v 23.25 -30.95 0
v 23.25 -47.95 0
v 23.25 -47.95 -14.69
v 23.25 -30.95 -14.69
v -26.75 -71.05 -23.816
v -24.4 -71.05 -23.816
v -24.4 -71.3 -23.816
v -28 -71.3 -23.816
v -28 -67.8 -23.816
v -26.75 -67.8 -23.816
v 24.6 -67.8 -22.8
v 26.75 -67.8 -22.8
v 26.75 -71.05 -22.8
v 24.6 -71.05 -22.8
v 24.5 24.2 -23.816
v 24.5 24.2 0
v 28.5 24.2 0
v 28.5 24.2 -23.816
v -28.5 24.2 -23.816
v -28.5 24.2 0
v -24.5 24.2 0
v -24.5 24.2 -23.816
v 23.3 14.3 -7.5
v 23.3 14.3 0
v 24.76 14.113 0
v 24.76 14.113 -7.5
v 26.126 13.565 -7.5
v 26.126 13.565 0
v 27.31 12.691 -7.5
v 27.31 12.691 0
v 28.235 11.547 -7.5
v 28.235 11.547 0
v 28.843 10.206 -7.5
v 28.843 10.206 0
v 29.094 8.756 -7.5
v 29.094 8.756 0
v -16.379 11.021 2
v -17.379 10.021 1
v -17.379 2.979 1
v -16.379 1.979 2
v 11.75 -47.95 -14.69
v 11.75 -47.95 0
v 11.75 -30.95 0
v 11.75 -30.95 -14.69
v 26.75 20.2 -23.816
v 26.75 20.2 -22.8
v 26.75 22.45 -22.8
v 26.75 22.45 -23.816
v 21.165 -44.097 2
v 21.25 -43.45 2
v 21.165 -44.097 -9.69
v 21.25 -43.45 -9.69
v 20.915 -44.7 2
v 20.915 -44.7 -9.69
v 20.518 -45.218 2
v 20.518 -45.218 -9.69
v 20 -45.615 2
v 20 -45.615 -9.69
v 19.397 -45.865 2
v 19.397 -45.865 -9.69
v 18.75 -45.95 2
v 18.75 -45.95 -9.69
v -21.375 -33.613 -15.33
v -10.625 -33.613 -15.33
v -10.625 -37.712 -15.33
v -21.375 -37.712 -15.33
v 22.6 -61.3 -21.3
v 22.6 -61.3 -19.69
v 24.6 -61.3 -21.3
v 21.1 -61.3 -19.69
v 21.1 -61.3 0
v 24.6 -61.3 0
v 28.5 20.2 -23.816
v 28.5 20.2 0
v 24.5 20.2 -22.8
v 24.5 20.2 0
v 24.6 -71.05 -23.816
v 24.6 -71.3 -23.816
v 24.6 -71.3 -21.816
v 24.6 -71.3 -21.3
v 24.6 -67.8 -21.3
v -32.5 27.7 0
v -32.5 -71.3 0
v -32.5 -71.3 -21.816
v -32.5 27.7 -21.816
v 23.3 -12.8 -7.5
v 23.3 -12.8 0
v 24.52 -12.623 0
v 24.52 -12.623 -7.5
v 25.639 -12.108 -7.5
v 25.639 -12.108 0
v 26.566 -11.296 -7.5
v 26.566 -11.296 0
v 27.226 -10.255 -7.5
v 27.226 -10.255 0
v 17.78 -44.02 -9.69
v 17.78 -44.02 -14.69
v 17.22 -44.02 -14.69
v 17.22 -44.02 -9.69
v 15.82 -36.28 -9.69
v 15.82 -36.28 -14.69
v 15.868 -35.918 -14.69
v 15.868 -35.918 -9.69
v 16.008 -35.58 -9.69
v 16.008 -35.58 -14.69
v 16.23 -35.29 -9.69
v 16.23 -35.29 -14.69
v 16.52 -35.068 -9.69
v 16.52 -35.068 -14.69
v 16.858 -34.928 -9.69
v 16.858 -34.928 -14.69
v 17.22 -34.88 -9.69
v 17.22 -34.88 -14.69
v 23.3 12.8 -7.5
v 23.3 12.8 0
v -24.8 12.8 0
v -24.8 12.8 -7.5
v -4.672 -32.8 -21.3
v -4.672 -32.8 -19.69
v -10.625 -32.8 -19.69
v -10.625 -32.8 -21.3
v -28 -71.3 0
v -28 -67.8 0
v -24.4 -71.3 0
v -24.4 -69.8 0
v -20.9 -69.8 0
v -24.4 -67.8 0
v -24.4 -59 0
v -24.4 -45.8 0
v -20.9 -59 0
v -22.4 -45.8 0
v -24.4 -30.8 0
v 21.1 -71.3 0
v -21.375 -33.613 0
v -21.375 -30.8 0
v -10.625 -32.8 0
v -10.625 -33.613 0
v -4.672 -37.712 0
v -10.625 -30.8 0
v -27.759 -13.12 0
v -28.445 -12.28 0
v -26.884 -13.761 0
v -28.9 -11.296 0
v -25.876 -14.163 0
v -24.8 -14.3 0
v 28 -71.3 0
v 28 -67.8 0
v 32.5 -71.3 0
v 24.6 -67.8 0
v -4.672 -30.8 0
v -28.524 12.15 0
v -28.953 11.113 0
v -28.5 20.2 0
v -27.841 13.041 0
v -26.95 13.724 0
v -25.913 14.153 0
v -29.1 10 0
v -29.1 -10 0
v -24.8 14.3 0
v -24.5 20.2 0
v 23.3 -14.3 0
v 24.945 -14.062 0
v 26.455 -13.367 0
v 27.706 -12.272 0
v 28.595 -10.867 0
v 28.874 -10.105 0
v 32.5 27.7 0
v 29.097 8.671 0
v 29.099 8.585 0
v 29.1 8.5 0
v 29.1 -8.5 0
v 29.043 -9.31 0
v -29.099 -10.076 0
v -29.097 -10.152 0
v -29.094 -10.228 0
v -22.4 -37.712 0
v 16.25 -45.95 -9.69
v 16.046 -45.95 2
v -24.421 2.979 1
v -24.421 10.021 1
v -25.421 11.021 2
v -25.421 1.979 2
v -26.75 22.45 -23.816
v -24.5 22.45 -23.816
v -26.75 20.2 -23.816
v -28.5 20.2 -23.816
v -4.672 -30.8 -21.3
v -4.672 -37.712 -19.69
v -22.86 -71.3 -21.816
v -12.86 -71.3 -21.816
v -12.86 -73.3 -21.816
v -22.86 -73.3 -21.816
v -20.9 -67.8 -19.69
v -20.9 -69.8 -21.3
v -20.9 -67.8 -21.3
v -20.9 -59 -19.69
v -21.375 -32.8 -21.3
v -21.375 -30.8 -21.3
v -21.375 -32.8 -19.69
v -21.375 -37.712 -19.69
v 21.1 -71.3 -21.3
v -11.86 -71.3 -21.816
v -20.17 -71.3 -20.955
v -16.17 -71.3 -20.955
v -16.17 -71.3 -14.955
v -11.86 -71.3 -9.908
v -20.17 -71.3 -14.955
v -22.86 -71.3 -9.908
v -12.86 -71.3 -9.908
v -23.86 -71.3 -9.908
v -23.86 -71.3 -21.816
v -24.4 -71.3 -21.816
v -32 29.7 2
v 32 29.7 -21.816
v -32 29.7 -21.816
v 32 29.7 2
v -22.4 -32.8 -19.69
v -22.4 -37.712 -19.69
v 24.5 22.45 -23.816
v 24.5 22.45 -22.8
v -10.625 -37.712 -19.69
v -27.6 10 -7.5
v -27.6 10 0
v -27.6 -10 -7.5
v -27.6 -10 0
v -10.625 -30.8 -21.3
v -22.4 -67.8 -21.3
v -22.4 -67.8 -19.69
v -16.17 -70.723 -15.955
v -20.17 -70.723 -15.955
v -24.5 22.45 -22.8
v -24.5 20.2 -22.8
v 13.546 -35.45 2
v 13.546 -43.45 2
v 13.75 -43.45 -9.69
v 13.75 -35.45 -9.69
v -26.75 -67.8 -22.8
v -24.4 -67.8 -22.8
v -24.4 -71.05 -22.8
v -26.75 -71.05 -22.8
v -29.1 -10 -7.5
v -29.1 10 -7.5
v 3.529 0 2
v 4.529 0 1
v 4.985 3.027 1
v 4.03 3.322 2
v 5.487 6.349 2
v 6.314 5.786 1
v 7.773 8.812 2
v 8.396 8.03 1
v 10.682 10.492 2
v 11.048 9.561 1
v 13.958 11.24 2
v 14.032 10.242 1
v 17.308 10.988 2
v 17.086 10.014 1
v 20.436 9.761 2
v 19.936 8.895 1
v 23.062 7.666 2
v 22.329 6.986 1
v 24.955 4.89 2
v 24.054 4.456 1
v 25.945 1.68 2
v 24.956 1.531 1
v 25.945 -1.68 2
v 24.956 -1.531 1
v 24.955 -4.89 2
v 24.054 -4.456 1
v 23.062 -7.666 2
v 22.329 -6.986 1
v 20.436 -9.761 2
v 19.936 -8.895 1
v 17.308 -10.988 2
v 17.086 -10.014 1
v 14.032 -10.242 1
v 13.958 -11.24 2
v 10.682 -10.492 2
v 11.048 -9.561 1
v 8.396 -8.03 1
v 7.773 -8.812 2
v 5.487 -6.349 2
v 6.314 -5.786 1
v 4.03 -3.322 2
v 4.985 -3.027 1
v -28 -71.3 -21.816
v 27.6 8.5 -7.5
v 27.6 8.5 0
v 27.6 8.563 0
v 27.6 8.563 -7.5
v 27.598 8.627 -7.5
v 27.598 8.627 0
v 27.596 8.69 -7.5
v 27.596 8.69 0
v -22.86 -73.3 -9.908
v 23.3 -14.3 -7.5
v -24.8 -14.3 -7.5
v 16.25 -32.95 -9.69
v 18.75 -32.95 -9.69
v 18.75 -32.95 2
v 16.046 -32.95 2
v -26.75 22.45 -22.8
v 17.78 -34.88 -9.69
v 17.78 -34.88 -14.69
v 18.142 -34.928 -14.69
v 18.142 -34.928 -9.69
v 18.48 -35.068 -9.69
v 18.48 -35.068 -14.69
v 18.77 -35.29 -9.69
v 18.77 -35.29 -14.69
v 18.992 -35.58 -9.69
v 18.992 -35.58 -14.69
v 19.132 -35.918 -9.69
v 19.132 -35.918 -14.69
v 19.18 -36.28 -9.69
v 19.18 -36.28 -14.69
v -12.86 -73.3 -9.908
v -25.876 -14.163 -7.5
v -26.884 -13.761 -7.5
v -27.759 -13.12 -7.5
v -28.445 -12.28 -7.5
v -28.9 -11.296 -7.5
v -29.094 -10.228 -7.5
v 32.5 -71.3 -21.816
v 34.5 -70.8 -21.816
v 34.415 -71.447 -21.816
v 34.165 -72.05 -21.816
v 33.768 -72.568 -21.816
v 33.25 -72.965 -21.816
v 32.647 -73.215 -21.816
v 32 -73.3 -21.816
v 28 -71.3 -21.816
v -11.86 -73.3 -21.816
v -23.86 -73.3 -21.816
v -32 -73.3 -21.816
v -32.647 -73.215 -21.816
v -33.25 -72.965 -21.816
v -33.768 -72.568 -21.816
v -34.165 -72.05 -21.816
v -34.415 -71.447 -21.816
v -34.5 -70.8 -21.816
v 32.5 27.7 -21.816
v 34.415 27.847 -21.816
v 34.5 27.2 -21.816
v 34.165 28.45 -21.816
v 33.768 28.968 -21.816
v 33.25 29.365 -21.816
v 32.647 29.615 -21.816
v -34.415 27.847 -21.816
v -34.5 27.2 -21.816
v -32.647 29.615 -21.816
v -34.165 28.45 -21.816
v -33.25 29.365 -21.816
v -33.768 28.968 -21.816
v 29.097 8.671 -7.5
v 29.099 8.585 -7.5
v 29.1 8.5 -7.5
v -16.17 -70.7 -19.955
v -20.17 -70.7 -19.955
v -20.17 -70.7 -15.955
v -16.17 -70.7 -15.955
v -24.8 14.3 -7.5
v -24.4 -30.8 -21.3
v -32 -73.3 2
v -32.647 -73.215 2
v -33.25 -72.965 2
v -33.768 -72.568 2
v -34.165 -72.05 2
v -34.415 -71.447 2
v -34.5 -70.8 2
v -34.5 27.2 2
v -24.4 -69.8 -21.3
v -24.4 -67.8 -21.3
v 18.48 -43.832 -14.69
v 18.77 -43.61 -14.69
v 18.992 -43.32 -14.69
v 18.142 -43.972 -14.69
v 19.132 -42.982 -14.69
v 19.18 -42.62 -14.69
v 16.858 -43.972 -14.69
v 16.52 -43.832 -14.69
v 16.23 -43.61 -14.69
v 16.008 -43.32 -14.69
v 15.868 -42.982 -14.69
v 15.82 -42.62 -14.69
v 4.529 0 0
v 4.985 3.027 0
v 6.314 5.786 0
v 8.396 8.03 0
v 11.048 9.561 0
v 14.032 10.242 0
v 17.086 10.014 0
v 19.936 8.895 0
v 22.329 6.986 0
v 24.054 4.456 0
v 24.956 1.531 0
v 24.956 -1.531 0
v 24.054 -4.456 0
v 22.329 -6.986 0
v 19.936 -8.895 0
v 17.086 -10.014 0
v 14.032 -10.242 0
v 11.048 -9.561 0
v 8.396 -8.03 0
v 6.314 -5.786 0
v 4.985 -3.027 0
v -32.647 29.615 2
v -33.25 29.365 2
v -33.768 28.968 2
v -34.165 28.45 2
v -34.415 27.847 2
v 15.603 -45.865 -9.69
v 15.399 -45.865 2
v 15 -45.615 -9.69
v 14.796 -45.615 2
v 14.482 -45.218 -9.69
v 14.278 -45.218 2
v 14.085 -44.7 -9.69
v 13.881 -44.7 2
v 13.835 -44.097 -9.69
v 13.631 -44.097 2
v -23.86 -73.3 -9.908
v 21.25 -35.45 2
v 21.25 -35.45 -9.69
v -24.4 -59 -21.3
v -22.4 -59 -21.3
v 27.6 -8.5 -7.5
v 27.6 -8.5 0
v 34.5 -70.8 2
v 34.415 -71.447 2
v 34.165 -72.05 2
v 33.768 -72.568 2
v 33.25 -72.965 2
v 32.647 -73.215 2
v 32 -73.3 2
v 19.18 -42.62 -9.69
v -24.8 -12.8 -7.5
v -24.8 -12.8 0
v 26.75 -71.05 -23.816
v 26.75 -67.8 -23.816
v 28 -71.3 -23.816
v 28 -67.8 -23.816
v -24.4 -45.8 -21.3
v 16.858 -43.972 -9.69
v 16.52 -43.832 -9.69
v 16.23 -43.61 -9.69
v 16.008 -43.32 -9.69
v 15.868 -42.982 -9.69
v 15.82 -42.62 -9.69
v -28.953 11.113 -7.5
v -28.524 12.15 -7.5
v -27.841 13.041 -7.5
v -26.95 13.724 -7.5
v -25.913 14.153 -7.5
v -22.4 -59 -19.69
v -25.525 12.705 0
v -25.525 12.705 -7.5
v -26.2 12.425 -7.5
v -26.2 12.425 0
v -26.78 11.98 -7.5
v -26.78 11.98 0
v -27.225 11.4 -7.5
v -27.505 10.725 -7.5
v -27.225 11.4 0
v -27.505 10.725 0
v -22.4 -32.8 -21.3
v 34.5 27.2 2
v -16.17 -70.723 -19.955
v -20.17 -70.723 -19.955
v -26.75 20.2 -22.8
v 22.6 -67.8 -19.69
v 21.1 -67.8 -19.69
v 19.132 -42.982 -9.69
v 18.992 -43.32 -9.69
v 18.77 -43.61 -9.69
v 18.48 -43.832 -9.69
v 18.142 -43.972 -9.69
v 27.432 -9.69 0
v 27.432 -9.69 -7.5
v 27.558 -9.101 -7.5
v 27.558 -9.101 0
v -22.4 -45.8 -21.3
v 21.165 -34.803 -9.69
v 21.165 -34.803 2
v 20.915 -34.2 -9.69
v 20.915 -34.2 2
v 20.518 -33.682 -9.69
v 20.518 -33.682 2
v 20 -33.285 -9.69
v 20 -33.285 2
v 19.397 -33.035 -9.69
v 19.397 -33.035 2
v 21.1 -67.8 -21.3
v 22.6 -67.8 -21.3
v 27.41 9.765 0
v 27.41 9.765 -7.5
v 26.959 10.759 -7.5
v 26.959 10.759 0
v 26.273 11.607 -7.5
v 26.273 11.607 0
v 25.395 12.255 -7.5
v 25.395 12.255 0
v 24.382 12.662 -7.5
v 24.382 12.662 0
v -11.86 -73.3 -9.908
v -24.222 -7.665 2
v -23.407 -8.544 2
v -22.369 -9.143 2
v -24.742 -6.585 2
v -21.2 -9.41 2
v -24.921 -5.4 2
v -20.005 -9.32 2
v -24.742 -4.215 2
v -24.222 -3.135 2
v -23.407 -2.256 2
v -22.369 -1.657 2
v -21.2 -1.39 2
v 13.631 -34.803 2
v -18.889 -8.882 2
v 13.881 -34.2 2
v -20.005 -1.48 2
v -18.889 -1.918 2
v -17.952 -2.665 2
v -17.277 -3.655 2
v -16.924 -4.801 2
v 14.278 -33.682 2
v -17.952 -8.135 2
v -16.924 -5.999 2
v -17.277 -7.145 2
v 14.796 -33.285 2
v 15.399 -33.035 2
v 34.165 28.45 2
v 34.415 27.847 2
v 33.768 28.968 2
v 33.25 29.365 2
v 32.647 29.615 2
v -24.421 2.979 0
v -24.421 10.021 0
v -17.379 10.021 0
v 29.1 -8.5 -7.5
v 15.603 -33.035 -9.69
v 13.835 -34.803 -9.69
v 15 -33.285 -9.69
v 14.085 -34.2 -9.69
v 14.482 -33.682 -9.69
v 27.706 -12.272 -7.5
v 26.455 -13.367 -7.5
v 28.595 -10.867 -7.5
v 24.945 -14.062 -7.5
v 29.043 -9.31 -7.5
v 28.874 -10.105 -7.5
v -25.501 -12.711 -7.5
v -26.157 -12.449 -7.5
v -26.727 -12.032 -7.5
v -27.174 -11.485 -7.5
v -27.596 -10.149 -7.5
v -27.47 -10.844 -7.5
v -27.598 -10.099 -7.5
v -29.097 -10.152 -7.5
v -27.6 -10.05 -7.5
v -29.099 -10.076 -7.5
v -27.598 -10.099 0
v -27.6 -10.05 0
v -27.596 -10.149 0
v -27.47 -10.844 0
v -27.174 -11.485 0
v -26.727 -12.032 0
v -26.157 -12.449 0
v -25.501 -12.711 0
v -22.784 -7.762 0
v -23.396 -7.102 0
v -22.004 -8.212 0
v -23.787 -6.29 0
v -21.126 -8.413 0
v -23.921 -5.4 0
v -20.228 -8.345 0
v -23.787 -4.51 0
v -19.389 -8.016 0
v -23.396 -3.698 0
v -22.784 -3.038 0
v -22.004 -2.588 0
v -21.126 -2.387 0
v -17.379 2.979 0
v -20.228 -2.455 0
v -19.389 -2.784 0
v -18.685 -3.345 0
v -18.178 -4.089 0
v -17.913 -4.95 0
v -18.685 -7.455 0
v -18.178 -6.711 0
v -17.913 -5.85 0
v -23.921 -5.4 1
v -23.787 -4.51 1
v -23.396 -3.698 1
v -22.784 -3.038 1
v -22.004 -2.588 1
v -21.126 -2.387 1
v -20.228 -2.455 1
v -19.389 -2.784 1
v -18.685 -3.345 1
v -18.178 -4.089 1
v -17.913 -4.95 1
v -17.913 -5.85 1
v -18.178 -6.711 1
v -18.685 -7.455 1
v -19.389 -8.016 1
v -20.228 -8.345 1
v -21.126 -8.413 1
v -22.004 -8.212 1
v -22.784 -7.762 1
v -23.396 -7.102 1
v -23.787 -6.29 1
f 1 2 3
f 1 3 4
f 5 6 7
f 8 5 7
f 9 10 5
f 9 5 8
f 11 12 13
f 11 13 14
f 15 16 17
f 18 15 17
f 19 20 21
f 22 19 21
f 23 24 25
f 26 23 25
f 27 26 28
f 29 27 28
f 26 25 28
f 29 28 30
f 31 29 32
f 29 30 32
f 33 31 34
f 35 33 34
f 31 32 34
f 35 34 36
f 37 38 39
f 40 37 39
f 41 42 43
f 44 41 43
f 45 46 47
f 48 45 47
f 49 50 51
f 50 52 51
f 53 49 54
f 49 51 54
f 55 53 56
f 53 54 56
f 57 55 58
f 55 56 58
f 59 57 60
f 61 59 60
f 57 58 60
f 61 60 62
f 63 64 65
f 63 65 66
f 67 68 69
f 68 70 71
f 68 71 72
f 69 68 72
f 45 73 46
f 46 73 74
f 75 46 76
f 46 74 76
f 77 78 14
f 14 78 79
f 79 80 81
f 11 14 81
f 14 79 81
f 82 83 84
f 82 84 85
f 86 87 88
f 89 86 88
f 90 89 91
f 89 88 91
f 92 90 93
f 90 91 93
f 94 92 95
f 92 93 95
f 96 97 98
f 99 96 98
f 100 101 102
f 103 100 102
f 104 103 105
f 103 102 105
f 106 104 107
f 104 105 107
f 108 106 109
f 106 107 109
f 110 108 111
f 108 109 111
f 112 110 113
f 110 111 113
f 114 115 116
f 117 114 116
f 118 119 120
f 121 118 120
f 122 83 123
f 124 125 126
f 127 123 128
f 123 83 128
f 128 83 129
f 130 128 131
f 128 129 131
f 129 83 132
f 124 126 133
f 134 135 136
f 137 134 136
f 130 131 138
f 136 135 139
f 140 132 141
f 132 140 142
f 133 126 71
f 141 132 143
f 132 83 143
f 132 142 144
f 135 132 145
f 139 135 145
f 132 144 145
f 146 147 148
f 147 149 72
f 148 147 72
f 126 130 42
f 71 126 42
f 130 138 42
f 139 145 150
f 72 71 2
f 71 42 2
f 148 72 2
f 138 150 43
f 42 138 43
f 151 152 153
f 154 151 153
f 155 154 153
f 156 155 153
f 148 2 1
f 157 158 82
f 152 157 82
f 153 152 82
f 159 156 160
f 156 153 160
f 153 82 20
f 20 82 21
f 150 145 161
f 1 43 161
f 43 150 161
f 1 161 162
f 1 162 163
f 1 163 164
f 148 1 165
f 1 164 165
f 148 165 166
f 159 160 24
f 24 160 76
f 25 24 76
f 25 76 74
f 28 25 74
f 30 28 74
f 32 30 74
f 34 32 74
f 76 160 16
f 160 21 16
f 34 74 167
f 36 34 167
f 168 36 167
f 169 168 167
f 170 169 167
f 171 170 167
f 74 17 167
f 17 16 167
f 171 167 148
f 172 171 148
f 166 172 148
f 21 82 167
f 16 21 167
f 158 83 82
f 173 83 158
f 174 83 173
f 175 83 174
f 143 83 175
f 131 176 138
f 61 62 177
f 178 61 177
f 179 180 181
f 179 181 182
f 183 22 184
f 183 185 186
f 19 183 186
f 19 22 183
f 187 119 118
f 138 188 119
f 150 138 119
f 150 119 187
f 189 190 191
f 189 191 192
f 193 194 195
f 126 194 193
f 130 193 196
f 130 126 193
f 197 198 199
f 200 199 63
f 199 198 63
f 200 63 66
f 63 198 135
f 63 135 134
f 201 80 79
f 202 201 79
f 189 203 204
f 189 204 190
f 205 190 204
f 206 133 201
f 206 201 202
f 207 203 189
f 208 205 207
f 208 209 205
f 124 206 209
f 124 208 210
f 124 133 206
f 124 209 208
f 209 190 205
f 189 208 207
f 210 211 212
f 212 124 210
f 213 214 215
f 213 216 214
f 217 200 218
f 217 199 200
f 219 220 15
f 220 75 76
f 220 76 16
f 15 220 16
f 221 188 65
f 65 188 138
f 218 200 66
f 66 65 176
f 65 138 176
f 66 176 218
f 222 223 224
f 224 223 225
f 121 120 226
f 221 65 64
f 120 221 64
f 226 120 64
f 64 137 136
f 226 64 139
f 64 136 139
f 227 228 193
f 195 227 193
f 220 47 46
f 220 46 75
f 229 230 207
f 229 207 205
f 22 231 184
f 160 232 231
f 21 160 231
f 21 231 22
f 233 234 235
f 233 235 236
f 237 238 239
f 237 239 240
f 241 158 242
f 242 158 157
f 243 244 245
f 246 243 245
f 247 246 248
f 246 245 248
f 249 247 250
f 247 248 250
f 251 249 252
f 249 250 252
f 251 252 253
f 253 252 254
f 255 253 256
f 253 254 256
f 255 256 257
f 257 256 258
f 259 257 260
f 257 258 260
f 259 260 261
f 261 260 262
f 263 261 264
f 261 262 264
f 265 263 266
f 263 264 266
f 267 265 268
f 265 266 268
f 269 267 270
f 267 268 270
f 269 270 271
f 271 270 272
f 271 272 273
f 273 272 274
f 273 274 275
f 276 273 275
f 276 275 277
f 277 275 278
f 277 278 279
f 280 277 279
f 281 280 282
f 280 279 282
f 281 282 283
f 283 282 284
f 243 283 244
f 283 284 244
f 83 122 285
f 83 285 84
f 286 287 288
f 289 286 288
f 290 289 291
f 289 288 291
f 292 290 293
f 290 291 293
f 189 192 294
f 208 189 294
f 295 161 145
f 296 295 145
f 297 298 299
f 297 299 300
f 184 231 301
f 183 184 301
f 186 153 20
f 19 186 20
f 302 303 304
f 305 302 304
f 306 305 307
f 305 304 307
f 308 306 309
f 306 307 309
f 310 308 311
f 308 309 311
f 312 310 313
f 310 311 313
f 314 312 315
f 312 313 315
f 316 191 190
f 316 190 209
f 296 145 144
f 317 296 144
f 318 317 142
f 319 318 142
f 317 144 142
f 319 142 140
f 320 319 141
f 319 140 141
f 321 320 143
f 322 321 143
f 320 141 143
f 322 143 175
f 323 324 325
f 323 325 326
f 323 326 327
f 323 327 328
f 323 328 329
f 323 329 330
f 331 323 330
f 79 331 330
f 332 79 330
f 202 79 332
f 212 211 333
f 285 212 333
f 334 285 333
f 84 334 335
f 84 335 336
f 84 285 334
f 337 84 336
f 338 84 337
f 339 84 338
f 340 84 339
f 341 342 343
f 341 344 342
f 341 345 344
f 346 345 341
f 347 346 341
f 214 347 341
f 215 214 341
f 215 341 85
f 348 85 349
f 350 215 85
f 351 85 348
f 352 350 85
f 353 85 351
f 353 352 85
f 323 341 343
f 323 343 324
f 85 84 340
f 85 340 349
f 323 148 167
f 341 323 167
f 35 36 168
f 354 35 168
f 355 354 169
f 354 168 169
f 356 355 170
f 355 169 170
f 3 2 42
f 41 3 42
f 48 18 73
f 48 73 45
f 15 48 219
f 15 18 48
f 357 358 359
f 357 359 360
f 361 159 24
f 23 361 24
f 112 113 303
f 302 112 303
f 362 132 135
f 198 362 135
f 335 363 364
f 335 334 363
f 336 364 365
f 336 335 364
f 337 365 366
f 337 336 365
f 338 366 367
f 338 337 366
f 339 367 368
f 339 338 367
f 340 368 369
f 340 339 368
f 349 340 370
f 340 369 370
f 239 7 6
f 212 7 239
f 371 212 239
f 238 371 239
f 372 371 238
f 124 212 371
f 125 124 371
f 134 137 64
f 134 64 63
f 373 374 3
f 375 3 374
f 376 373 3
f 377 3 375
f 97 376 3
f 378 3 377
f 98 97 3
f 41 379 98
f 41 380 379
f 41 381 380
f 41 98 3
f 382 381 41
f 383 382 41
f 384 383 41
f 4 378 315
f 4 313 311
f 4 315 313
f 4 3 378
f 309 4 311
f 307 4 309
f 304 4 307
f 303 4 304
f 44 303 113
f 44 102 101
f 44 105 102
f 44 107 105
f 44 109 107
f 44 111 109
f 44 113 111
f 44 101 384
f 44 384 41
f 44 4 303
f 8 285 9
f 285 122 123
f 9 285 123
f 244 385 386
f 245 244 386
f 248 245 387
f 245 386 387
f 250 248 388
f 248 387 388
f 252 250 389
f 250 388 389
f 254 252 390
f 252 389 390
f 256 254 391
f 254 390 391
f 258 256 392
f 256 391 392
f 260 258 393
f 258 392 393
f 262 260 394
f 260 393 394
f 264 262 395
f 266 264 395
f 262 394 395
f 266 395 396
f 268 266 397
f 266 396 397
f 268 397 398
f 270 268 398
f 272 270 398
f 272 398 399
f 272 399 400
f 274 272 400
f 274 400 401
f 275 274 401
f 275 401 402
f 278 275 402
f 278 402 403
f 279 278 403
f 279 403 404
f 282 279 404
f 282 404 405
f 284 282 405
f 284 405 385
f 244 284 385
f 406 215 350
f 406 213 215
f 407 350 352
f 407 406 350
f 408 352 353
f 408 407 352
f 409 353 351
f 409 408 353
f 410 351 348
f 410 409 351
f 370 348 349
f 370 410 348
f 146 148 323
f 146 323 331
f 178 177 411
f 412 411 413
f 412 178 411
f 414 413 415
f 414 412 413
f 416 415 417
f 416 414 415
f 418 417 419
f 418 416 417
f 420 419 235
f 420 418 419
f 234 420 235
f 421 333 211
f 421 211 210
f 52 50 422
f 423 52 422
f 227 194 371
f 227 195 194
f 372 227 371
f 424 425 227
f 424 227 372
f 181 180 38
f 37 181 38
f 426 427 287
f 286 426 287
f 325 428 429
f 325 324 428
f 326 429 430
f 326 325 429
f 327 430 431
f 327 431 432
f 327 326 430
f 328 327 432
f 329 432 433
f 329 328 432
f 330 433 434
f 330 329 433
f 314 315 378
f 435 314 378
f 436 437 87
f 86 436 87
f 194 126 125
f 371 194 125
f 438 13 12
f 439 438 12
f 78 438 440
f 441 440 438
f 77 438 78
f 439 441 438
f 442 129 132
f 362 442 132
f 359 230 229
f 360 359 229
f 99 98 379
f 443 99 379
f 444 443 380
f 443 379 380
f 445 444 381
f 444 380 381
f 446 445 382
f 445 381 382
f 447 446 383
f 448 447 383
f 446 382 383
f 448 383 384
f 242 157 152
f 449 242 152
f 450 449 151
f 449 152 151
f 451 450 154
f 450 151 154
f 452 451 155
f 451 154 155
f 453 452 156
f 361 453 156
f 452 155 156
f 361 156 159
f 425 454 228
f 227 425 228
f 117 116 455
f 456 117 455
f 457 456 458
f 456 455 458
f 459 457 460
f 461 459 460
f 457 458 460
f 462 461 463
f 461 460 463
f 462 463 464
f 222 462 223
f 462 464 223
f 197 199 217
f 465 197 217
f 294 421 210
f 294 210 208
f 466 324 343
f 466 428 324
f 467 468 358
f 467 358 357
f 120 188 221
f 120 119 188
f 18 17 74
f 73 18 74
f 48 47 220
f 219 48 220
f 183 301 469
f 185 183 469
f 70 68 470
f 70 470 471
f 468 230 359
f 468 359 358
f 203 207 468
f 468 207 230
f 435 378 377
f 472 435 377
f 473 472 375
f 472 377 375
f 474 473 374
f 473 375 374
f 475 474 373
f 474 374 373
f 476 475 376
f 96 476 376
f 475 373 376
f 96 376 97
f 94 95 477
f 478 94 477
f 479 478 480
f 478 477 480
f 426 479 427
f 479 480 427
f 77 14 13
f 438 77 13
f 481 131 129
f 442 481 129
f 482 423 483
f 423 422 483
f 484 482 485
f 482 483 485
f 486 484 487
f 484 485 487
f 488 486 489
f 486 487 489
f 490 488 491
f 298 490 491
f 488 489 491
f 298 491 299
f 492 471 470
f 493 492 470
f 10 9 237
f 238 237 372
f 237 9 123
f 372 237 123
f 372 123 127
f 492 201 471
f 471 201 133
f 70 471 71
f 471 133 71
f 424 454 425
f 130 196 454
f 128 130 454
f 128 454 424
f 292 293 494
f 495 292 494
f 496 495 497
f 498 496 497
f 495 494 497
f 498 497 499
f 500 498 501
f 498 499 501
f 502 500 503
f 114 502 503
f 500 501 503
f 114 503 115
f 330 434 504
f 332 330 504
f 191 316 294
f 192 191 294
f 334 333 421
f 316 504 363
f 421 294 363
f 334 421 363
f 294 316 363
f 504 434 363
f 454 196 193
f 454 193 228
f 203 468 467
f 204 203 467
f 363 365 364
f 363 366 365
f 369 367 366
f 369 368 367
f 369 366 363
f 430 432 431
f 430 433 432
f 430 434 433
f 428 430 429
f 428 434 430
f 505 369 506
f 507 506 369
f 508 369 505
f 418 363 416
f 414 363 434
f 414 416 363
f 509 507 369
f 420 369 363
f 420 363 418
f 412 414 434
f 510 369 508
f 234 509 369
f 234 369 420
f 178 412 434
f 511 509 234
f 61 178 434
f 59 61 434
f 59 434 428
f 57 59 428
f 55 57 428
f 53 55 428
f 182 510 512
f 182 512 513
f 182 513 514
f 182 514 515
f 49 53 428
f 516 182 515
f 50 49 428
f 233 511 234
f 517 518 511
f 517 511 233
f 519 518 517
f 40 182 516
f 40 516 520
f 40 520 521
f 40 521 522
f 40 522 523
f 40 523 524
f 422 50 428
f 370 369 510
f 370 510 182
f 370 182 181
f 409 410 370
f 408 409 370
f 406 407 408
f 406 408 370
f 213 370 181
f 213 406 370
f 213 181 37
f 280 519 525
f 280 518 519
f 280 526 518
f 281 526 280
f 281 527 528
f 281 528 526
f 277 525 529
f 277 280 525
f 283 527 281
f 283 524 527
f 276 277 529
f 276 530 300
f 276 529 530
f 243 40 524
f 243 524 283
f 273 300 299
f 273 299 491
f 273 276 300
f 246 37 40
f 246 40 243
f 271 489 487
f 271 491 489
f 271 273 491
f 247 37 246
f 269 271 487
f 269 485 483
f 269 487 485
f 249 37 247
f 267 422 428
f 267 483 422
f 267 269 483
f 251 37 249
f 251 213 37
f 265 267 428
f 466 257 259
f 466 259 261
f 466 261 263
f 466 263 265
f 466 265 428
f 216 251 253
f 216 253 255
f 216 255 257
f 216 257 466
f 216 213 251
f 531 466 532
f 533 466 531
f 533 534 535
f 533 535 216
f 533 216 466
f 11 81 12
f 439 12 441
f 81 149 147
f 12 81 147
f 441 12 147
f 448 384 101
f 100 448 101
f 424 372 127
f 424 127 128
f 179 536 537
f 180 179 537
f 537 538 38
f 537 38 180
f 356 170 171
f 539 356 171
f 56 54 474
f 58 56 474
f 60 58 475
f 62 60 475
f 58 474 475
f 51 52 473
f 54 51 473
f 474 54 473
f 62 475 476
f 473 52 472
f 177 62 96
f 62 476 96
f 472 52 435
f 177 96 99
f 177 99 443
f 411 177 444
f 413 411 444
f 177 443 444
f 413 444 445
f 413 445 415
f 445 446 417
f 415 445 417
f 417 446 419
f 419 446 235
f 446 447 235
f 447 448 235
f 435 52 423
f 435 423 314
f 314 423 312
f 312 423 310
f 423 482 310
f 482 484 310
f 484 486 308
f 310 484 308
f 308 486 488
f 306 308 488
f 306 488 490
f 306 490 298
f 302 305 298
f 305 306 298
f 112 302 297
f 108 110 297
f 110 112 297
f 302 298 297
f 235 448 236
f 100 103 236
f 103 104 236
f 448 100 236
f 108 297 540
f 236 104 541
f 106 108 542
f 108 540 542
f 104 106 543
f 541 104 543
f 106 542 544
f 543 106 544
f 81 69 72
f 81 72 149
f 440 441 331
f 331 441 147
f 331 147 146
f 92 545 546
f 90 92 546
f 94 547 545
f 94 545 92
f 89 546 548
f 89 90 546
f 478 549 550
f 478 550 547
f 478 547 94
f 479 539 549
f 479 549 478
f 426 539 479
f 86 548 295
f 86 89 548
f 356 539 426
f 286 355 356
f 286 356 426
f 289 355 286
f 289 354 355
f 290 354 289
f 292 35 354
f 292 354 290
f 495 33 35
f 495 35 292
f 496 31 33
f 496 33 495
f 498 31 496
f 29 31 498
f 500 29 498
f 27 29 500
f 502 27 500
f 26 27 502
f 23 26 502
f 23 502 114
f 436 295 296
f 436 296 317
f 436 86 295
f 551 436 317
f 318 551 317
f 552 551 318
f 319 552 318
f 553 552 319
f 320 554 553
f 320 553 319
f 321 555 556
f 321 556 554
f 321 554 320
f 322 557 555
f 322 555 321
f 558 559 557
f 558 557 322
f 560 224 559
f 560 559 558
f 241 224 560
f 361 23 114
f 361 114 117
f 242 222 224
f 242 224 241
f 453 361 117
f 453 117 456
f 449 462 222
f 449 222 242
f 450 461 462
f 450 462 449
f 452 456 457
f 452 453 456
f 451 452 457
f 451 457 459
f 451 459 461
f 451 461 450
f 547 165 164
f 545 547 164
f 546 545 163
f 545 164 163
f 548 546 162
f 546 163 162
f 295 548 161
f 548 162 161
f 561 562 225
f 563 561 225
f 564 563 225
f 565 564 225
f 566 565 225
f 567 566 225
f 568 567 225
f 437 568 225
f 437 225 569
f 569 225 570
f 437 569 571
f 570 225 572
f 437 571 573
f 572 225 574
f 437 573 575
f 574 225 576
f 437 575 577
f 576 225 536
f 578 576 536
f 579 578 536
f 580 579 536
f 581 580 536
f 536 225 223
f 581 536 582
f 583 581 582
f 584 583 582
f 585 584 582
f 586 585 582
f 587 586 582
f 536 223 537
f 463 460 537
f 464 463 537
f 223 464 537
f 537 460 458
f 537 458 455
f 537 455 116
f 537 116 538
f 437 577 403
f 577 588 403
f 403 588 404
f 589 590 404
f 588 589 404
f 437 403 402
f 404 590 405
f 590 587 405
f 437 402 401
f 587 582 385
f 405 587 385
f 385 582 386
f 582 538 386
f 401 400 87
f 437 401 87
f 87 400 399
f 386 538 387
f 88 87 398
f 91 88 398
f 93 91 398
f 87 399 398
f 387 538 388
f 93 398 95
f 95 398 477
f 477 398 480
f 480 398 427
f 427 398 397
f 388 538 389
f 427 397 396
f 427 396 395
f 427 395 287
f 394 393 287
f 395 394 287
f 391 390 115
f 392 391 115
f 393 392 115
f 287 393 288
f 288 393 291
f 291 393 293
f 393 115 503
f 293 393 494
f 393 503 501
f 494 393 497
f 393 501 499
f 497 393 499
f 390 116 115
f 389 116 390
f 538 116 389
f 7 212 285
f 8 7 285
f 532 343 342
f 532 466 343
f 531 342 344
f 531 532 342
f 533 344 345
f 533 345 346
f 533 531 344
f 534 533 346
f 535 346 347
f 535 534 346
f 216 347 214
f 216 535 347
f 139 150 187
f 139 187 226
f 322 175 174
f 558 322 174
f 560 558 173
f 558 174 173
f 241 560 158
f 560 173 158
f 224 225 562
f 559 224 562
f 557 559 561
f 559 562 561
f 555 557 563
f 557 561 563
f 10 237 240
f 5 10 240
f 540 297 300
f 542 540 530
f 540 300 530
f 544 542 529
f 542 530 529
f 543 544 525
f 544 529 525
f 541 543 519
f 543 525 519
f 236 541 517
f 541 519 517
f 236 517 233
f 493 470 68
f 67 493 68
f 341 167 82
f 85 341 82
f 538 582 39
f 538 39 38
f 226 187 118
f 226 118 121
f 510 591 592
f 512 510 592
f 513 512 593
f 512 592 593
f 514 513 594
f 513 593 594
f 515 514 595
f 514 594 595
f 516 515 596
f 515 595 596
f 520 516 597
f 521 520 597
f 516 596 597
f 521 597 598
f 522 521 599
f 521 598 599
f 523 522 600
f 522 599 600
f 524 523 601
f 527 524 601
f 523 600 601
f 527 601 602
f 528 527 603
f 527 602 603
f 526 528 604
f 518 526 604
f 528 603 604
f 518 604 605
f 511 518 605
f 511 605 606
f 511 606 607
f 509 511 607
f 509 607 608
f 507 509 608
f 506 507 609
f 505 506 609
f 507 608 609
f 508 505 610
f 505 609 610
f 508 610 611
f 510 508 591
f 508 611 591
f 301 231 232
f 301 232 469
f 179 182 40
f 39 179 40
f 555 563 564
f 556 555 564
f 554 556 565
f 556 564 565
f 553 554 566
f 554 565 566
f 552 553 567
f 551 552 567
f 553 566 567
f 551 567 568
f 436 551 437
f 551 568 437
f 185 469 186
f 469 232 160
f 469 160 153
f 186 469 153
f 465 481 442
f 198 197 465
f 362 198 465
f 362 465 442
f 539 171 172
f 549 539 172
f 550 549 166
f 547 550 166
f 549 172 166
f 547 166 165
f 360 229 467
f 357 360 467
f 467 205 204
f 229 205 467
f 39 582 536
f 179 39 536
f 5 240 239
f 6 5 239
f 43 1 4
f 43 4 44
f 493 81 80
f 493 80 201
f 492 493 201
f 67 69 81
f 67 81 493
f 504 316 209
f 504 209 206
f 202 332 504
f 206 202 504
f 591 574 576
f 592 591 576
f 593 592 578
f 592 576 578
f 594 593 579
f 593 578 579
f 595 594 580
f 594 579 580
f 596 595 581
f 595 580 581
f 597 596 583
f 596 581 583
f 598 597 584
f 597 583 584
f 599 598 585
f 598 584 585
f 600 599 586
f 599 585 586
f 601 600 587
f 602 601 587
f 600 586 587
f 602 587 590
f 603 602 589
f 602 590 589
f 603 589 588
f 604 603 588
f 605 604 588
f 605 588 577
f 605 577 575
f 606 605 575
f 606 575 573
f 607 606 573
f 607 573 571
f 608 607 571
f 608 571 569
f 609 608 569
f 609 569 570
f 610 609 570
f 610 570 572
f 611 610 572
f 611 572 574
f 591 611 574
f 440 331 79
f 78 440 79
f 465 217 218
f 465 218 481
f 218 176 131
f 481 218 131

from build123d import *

# Parameters (mm, degrees)
SKETCH2_W            = 69
SKETCH2_H            = 103
BOSS_EXTRUDE1_DEPTH  = 2
SKETCH3_W            = 69
SKETCH3_H            = 103
SKETCH3_W_2          = 65
SKETCH3_H_2          = 99
BOSS_EXTRUDE2_DEPTH  = 21.816
BOSS_EXTRUDE3_DEPTH  = 7.5
SKETCH7_R            = 10.271022242
SKETCH7_R_2          = 3.021022242
SKETCH7_W            = 7.042044484
SKETCH7_H            = 7.042044484
CUT_EXTRUDE1_DEPTH   = 84.899212487
SKETCH9_W            = 1.5
SKETCH9_H            = 6.5
SKETCH9_H_2          = 8.8
BOSS_EXTRUDE4_DEPTH  = 19.69
BOSS_EXTRUDE5_DEPTH  = 21.3
SKETCH10_W           = 10.75
SKETCH10_H           = 4.1
BOSS_EXTRUDE6_DEPTH  = 15.33
BOSS_EXTRUDE7_DEPTH  = 19.69
SKETCH10_6_W         = 5.953168401
SKETCH10_6_H         = 2
BOSS_EXTRUDE8_DEPTH  = 21.3
SKETCH11_W           = 7.5
SKETCH11_H           = 13
CUT_EXTRUDE2_DEPTH   = 84.899212487
FILLET2_R            = 2.5
CHAMFER1_SIZE        = 1
CUT_EXTRUDE3_REACH   = 112.793
SKETCH12_W           = 1
SKETCH12_H           = 11.908
SKETCH13_W           = 11.5
SKETCH13_H           = 17
SKETCH13_W_2         = 7.5
SKETCH13_H_2         = 13
BOSS_EXTRUDE9_DEPTH  = 14.69
SKETCH14_W           = 7.5
SKETCH14_H           = 13
BOSS_EXTRUDE10_DEPTH = 5
DRAFT1_ANGLE         = 1
FILLET3_R            = 2.5
SKETCH15_W           = 4
SKETCH15_H           = 4
BOSS_EXTRUDE11_DEPTH = 0.6
CHAMFER3_SIZE        = 1
CHAMFER3_SIZE2       = 0.577350269
CHAMFER4_SIZE        = 1
CHAMFER4_SIZE2       = 0.577350269
SKETCH16_W           = 2.35
SKETCH16_H           = 3.25
SKETCH16_W_2         = 2.15
SKETCH16_W_3         = 2.25
SKETCH16_H_2         = 2.25
BOSS_EXTRUDE12_DEPTH = 22.8
BOSS_EXTRUDE13_DEPTH = 23.816


with BuildPart() as part:
    # Sketch2 → Boss-Extrude1 (new body)
    with BuildSketch(Plane.XY):
        with Locations((0, -21.8)):
            Rectangle(SKETCH2_W, SKETCH2_H)
    extrude(amount=BOSS_EXTRUDE1_DEPTH)

    # Sketch3 → Boss-Extrude2 (add)
    with BuildSketch(Plane(origin=(0, 0, 0), x_dir=(-1, 0, 0), z_dir=(0, 0, -1))):
        with Locations((0, -21.8)):
            Rectangle(SKETCH3_W, SKETCH3_H)
        with Locations((0, -21.8)):
            Rectangle(SKETCH3_W_2, SKETCH3_H_2, mode=Mode.SUBTRACT)
    extrude(amount=BOSS_EXTRUDE2_DEPTH)

    # Sketch4 → Boss-Extrude3 (add)
    with BuildSketch(Plane(origin=(0, 0, 0), x_dir=(-1, 0, 0), z_dir=(0, 0, -1))):
        with BuildLine():
            Line((29.1, -10), (29.1, -8.439131361))
            Line((29.1, -8.439131361), (29.1, -7.690100036))
            Line((29.1, -7.690100036), (29.1, -6.395046928))
            Line((29.1, -6.395046928), (29.1, -1.888728371))
            Line((29.1, -1.888728371), (29.1, -0.762895346))
            Line((29.1, -0.762895346), (29.1, 3.740436753))
            Line((29.1, 3.740436753), (29.1, 8.676781555))
            Line((29.1, 8.676781555), (29.1, 10))
            ThreePointArc((29.1, 10), (27.840559159, 13.040559159), (24.8, 14.3))
            Line((24.8, 14.3), (16.963486262, 14.3))
            Line((16.963486262, 14.3), (14.426316186, 14.3))
            Line((14.426316186, 14.3), (11.750363034, 14.3))
            Line((11.750363034, 14.3), (8.649377385, 14.3))
            Line((8.649377385, 14.3), (-2.251077026, 14.3))
            Line((-2.251077026, 14.3), (-4.779023688, 14.3))
            Line((-4.779023688, 14.3), (-12.46242881, 14.3))
            Line((-12.46242881, 14.3), (-14.530748807, 14.3))
            Line((-14.530748807, 14.3), (-23.3, 14.3))
            ThreePointArc((-23.3, 14.3), (-27.309567753, 12.690867027), (-29.094332857, 8.756333254))
            ThreePointArc((-29.094332857, 8.756333254), (-29.098583041, 8.628197946), (-29.1, 8.5))
            Line((-29.1, 8.5), (-29.1, 3.740436753))
            Line((-29.1, 3.740436753), (-29.1, -0.762895346))
            Line((-29.1, -0.762895346), (-29.1, -1.888728371))
            Line((-29.1, -1.888728371), (-29.1, -6.395046928))
            Line((-29.1, -6.395046928), (-29.1, -7.690100036))
            Line((-29.1, -7.690100036), (-29.1, -8.439131361))
            Line((-29.1, -8.439131361), (-29.1, -8.5))
            ThreePointArc((-29.1, -8.5), (-28.97231091, -9.710325965), (-28.594865883, -10.867360405))
            ThreePointArc((-28.594865883, -10.867360405), (-26.455099812, -13.366759206), (-23.3, -14.3))
            Line((-23.3, -14.3), (-14.530748807, -14.3))
            Line((-14.530748807, -14.3), (-12.46242881, -14.3))
            Line((-12.46242881, -14.3), (-4.779023688, -14.3))
            Line((-4.779023688, -14.3), (-2.251077026, -14.3))
            Line((-2.251077026, -14.3), (8.649377385, -14.3))
            Line((8.649377385, -14.3), (11.750363034, -14.3))
            Line((11.750363034, -14.3), (14.426316186, -14.3))
            Line((14.426316186, -14.3), (16.963486262, -14.3))
            Line((16.963486262, -14.3), (24.8, -14.3))
            ThreePointArc((24.8, -14.3), (27.758786007, -13.120189956), (29.093941573, -10.228179239))
            ThreePointArc((29.093941573, -10.228179239), (29.098485126, -10.114129827), (29.1, -10))
        make_face()
        with BuildLine():
            Line((24.8, -12.8), (16.963486262, -12.8))
            Line((16.963486262, -12.8), (14.426316186, -12.8))
            Line((14.426316186, -12.8), (11.750363034, -12.8))
            Line((11.750363034, -12.8), (8.649377385, -12.8))
            Line((8.649377385, -12.8), (-2.251077026, -12.8))
            Line((-2.251077026, -12.8), (-4.779023688, -12.8))
            Line((-4.779023688, -12.8), (-12.46242881, -12.8))
            Line((-12.46242881, -12.8), (-14.530748807, -12.8))
            Line((-14.530748807, -12.8), (-23.3, -12.8))
            ThreePointArc((-23.3, -12.8), (-25.639125723, -12.108114584), (-27.225504016, -10.255112024))
            ThreePointArc((-27.225504016, -10.255112024), (-27.505333951, -9.397310629), (-27.6, -8.5))
            Line((-27.6, -8.5), (-27.6, -8.439131361))
            Line((-27.6, -8.439131361), (-27.6, -7.690100036))
            Line((-27.6, -7.690100036), (-27.6, -6.395046928))
            Line((-27.6, -6.395046928), (-27.6, -1.888728371))
            Line((-27.6, -1.888728371), (-27.6, -0.762895346))
            Line((-27.6, -0.762895346), (-27.6, 3.740436753))
            Line((-27.6, 3.740436753), (-27.6, 8.5))
            ThreePointArc((-27.6, 8.5), (-27.598949496, 8.595043305), (-27.595798498, 8.690040171))
            ThreePointArc((-27.595798498, 8.690040171), (-26.272610575, 11.607022106), (-23.3, 12.8))
            Line((-23.3, 12.8), (-14.530748807, 12.8))
            Line((-14.530748807, 12.8), (-12.46242881, 12.8))
            Line((-12.46242881, 12.8), (-4.779023688, 12.8))
            Line((-4.779023688, 12.8), (-2.251077026, 12.8))
            Line((-2.251077026, 12.8), (8.649377385, 12.8))
            Line((8.649377385, 12.8), (11.750363034, 12.8))
            Line((11.750363034, 12.8), (14.426316186, 12.8))
            Line((14.426316186, 12.8), (16.963486262, 12.8))
            Line((16.963486262, 12.8), (24.8, 12.8))
            ThreePointArc((24.8, 12.8), (26.779898987, 11.979898987), (27.6, 10))
            Line((27.6, 10), (27.6, 8.676781555))
            Line((27.6, 8.676781555), (27.6, 3.740436753))
            Line((27.6, 3.740436753), (27.6, -0.762895346))
            Line((27.6, -0.762895346), (27.6, -1.888728371))
            Line((27.6, -1.888728371), (27.6, -6.395046928))
            Line((27.6, -6.395046928), (27.6, -7.690100036))
            Line((27.6, -7.690100036), (27.6, -8.439131361))
            Line((27.6, -8.439131361), (27.6, -10))
            ThreePointArc((27.6, -10), (27.599013571, -10.074317097), (27.596054978, -10.14858183))
            ThreePointArc((27.596054978, -10.14858183), (26.726651354, -12.031751599), (24.8, -12.8))
        make_face(mode=Mode.SUBTRACT)
    extrude(amount=BOSS_EXTRUDE3_DEPTH)

    # Sketch7 → Cut-Extrude1 (cut, through all)
    with BuildSketch(Plane(origin=(0, 0, 0), x_dir=(-1, 0, 0), z_dir=(0, 0, -1))):
        with Locations((-14.8, 0)):
            Circle(SKETCH7_R)
        with Locations((20.9, -5.4)):
            Circle(SKETCH7_R_2)
        with Locations((20.9, 6.5)):
            Rectangle(SKETCH7_W, SKETCH7_H)
    extrude(amount=-CUT_EXTRUDE1_DEPTH, mode=Mode.SUBTRACT)

    # Sketch9 → Boss-Extrude4 (add)
    with BuildSketch(Plane(origin=(0, 0, 0), x_dir=(-1, 0, 0), z_dir=(0, 0, -1))):
        with Locations((-21.85, -64.55)):
            Rectangle(SKETCH9_W, SKETCH9_H)
        with Locations((21.65, -63.4)):
            Rectangle(SKETCH9_W, SKETCH9_H_2)
    extrude(amount=BOSS_EXTRUDE4_DEPTH)

    # Sketch9<4> → Boss-Extrude5 (add)
    with BuildSketch(Plane(origin=(0, 0, 0), x_dir=(-1, 0, 0), z_dir=(0, 0, -1))):
        Polygon((-24.6, -61.3), (-24.6, -71.3), (-21.1, -71.3), (-21.1, -67.8), (-22.6, -67.8), (-22.6, -61.3), align=None)
        Polygon((20.9, -69.8), (24.4, -69.8), (24.4, -59), (22.4, -59), (22.4, -67.8), (20.9, -67.8), align=None)
    extrude(amount=BOSS_EXTRUDE5_DEPTH)

    # Sketch10 → Boss-Extrude6 (add)
    with BuildSketch(Plane(origin=(0, 0, 0), x_dir=(-1, 0, 0), z_dir=(0, 0, -1))):
        with Locations((16, -35.6625)):
            Rectangle(SKETCH10_W, SKETCH10_H)
    extrude(amount=BOSS_EXTRUDE6_DEPTH)

    # Sketch10<4> → Boss-Extrude7 (add)
    with BuildSketch(Plane(origin=(0, 0, 0), x_dir=(-1, 0, 0), z_dir=(0, 0, -1))):
        Polygon((21.375, -37.7125), (22.4, -37.7125), (22.4, -32.8), (21.375, -32.8), (21.375, -33.6125), align=None)
        Polygon((4.671831599, -37.7125), (10.625, -37.7125), (10.625, -33.6125), (10.625, -32.8), (4.671831599, -32.8), align=None)
    extrude(amount=BOSS_EXTRUDE7_DEPTH)

    # Sketch10<6> → Boss-Extrude8 (add)
    with BuildSketch(Plane(origin=(0, 0, 0), x_dir=(-1, 0, 0), z_dir=(0, 0, -1))):
        with Locations((7.6484158, -31.8)):
            Rectangle(SKETCH10_6_W, SKETCH10_6_H)
        Polygon((22.4, -37.7125), (22.4, -45.8), (24.4, -45.8), (24.4, -30.8), (21.375, -30.8), (21.375, -32.8), (22.4, -32.8), align=None)
    extrude(amount=BOSS_EXTRUDE8_DEPTH)

    # Sketch11 → Cut-Extrude2 (cut, through all)
    with BuildSketch(Plane(origin=(0, 0, 0), x_dir=(-1, 0, 0), z_dir=(0, 0, -1))):
        with Locations((-17.5, -39.45)):
            Rectangle(SKETCH11_W, SKETCH11_H)
    extrude(amount=-CUT_EXTRUDE2_DEPTH, mode=Mode.SUBTRACT)

    # Fillet2
    fillet2_edges = [part.edges().sort_by_distance(p)[0] for p in [
        (-34.5, 29.7, -9.908),
        (34.5, 29.7, -9.908),
        (34.5, -73.3, -9.908),
        (-34.5, -73.3, -9.908),
    ]]
    fillet(fillet2_edges, radius=FILLET2_R)

    # Chamfer1
    chamfer1_edges = [part.edges().sort_by_distance(p)[0] for p in [
        (25.071022242, 0, 2),
        (-17.878977758, -5.4, 2),
        (-24.421022242, 6.5, 2),
        (-20.9, 2.978977758, 2),
        (-17.378977758, 6.5, 2),
        (-20.9, 10.021022242, 2),
    ]]
    chamfer(chamfer1_edges, length=CHAMFER1_SIZE)

    # Sketch12 → Cut-Extrude3 (cut, up to next)
    with BuildSketch(Plane.XZ.offset(73.3), mode=Mode.PRIVATE) as cut_extrude3_sk1:
        with Locations((-23.360094853, -15.862)):
            Rectangle(SKETCH12_W, SKETCH12_H)
    cut_extrude3_tool1 = extrude(cut_extrude3_sk1.sketch, amount=-CUT_EXTRUDE3_REACH, mode=Mode.PRIVATE) & part.part
    # Sketch12 → Cut-Extrude3 (cut, up to next)
    with BuildSketch(Plane.XZ.offset(73.3), mode=Mode.PRIVATE) as cut_extrude3_sk2:
        with Locations((-12.360094853, -15.862)):
            Rectangle(SKETCH12_W, SKETCH12_H)
    cut_extrude3_tool2 = extrude(cut_extrude3_sk2.sketch, amount=-CUT_EXTRUDE3_REACH, mode=Mode.PRIVATE) & part.part
    add(cut_extrude3_tool1.solids().sort_by_distance((-23.360095, -73.3, -15.862))[0], mode=Mode.SUBTRACT)
    add(cut_extrude3_tool2.solids().sort_by_distance((-12.360095, -73.3, -15.862))[0], mode=Mode.SUBTRACT)

    # Sketch13 → Boss-Extrude9 (add)
    with BuildSketch(Plane(origin=(0, 0, 0), x_dir=(-1, 0, 0), z_dir=(0, 0, -1))):
        with Locations((-17.5, -39.45)):
            Rectangle(SKETCH13_W, SKETCH13_H)
        with Locations((-17.5, -39.45)):
            Rectangle(SKETCH13_W_2, SKETCH13_H_2, mode=Mode.SUBTRACT)
    extrude(amount=BOSS_EXTRUDE9_DEPTH)

    # Sketch14 → Boss-Extrude10 (add)
    # profile 1 of 2: a face of its own
    with BuildSketch(Plane(origin=(0, 0, -14.69), x_dir=(-1, 0, 0), z_dir=(0, 0, -1))):
        with Locations((-17.5, -39.45)):
            Rectangle(SKETCH14_W, SKETCH14_H)
        with BuildLine():
            Line((-17.22, -34.88), (-17.78, -34.88))
            ThreePointArc((-17.78, -34.88), (-18.769949494, -35.290050506), (-19.18, -36.28))
            Line((-19.18, -36.28), (-19.18, -42.62))
            ThreePointArc((-19.18, -42.62), (-18.769949494, -43.609949494), (-17.78, -44.02))
            Line((-17.78, -44.02), (-17.22, -44.02))
            ThreePointArc((-17.22, -44.02), (-16.230050506, -43.609949494), (-15.82, -42.62))
            Line((-15.82, -42.62), (-15.82, -36.28))
            ThreePointArc((-15.82, -36.28), (-16.230050506, -35.290050506), (-17.22, -34.88))
        make_face(mode=Mode.SUBTRACT)
    # profile 2 of 2: a face of its own
    with BuildSketch(Plane(origin=(0, 0, -14.69), x_dir=(-1, 0, 0), z_dir=(0, 0, -1))):
        with BuildLine():
            Line((-17.22, -34.98), (-17.78, -34.98))
            ThreePointArc((-17.78, -34.98), (-18.699238816, -35.360761184), (-19.08, -36.28))
            Line((-19.08, -36.28), (-19.08, -42.62))
            ThreePointArc((-19.08, -42.62), (-18.699238816, -43.539238816), (-17.78, -43.92))
            Line((-17.78, -43.92), (-17.22, -43.92))
            ThreePointArc((-17.22, -43.92), (-16.300761184, -43.539238816), (-15.92, -42.62))
            Line((-15.92, -42.62), (-15.92, -36.28))
            ThreePointArc((-15.92, -36.28), (-16.300761184, -35.360761184), (-17.22, -34.98))
        make_face()
    extrude(amount=-BOSS_EXTRUDE10_DEPTH)


with BuildPart() as boss_extrude10_kept_piece:
    # of the separate pieces the step leaves, the one the design keeps (boss_extrude10_pieces_kept)
    add(part.part.solids().sort_by_distance((3.528977758, 0, 2))[0])

    # Draft1
    draft1_faces = [boss_extrude10_kept_piece.faces().sort_by_distance(p)[0] for p in [
        (13.75, -39.45, -3.845),
    ]]
    draft(draft1_faces, Plane.XY.offset(-9.69), DRAFT1_ANGLE)

    # Fillet3
    fillet3_edges = [boss_extrude10_kept_piece.edges().sort_by_distance(p)[0] for p in [
        (13.647975145, -32.95, -3.845),
        (13.647975145, -45.95, -3.845),
        (21.25, -45.95, -3.845),
        (21.25, -32.95, -3.845),
    ]]
    fillet(fillet3_edges, radius=FILLET3_R)

    # Sketch15 → Boss-Extrude11 (add)
    with BuildSketch(Plane(origin=(0, -71.3, 0), x_dir=(1, 0, 0), z_dir=(0, 1, 0))):
        with Locations((-18.17, 17.955)):
            Rectangle(SKETCH15_W, SKETCH15_H)
    extrude(amount=BOSS_EXTRUDE11_DEPTH)

    # Chamfer3
    chamfer3_edges = [boss_extrude10_kept_piece.edges().sort_by_distance(p)[0] for p in [
        (-18.17, -71.3, -15.955),
    ]]
    chamfer3_side = [boss_extrude10_kept_piece.faces().sort_by_distance(p)[0] for p in [
        (-0.757391404, -71.3, -10.745764223),
    ]]
    chamfer(chamfer3_edges, length=CHAMFER3_SIZE, length2=CHAMFER3_SIZE2, reference=chamfer3_side[0])

    # Chamfer4
    chamfer4_edges = [boss_extrude10_kept_piece.edges().sort_by_distance(p)[0] for p in [
        (-18.17, -71.3, -19.955),
    ]]
    chamfer4_side = [boss_extrude10_kept_piece.faces().sort_by_distance(p)[0] for p in [
        (-0.703800708, -71.3, -10.731270632),
    ]]
    chamfer(chamfer4_edges, length=CHAMFER4_SIZE, length2=CHAMFER4_SIZE2, reference=chamfer4_side[0])

    # Sketch16 → Boss-Extrude12 (add)
    with BuildSketch(Plane(origin=(0, 0, 0), x_dir=(-1, 0, 0), z_dir=(0, 0, -1))):
        with Locations((25.575, -69.425)):
            Rectangle(SKETCH16_W, SKETCH16_H)
        with Locations((-25.675, -69.425)):
            Rectangle(SKETCH16_W_2, SKETCH16_H)
        with Locations((25.625, 21.325)):
            Rectangle(SKETCH16_W_3, SKETCH16_H_2)
        with Locations((-25.625, 21.325)):
            Rectangle(SKETCH16_W_3, SKETCH16_H_2)
    extrude(amount=BOSS_EXTRUDE12_DEPTH)

    # Sketch16<4> → Boss-Extrude13 (add)
    with BuildSketch(Plane(origin=(0, 0, 0), x_dir=(-1, 0, 0), z_dir=(0, 0, -1))):
        Polygon((28, -67.8), (26.75, -67.8), (26.75, -71.05), (24.4, -71.05), (24.4, -71.3), (28, -71.3), align=None)
        Polygon((-26.75, -71.05), (-26.75, -67.8), (-28, -67.8), (-28, -71.3), (-24.6, -71.3), (-24.6, -71.05), align=None)
        Polygon((28.5, 20.2), (28.5, 24.2), (24.5, 24.2), (24.5, 22.45), (26.75, 22.45), (26.75, 20.2), align=None)
        Polygon((-24.5, 22.45), (-24.5, 24.2), (-28.5, 24.2), (-28.5, 20.2), (-26.75, 20.2), (-26.75, 22.45), align=None)
    extrude(amount=BOSS_EXTRUDE13_DEPTH)


solid = boss_extrude10_kept_piece.part
